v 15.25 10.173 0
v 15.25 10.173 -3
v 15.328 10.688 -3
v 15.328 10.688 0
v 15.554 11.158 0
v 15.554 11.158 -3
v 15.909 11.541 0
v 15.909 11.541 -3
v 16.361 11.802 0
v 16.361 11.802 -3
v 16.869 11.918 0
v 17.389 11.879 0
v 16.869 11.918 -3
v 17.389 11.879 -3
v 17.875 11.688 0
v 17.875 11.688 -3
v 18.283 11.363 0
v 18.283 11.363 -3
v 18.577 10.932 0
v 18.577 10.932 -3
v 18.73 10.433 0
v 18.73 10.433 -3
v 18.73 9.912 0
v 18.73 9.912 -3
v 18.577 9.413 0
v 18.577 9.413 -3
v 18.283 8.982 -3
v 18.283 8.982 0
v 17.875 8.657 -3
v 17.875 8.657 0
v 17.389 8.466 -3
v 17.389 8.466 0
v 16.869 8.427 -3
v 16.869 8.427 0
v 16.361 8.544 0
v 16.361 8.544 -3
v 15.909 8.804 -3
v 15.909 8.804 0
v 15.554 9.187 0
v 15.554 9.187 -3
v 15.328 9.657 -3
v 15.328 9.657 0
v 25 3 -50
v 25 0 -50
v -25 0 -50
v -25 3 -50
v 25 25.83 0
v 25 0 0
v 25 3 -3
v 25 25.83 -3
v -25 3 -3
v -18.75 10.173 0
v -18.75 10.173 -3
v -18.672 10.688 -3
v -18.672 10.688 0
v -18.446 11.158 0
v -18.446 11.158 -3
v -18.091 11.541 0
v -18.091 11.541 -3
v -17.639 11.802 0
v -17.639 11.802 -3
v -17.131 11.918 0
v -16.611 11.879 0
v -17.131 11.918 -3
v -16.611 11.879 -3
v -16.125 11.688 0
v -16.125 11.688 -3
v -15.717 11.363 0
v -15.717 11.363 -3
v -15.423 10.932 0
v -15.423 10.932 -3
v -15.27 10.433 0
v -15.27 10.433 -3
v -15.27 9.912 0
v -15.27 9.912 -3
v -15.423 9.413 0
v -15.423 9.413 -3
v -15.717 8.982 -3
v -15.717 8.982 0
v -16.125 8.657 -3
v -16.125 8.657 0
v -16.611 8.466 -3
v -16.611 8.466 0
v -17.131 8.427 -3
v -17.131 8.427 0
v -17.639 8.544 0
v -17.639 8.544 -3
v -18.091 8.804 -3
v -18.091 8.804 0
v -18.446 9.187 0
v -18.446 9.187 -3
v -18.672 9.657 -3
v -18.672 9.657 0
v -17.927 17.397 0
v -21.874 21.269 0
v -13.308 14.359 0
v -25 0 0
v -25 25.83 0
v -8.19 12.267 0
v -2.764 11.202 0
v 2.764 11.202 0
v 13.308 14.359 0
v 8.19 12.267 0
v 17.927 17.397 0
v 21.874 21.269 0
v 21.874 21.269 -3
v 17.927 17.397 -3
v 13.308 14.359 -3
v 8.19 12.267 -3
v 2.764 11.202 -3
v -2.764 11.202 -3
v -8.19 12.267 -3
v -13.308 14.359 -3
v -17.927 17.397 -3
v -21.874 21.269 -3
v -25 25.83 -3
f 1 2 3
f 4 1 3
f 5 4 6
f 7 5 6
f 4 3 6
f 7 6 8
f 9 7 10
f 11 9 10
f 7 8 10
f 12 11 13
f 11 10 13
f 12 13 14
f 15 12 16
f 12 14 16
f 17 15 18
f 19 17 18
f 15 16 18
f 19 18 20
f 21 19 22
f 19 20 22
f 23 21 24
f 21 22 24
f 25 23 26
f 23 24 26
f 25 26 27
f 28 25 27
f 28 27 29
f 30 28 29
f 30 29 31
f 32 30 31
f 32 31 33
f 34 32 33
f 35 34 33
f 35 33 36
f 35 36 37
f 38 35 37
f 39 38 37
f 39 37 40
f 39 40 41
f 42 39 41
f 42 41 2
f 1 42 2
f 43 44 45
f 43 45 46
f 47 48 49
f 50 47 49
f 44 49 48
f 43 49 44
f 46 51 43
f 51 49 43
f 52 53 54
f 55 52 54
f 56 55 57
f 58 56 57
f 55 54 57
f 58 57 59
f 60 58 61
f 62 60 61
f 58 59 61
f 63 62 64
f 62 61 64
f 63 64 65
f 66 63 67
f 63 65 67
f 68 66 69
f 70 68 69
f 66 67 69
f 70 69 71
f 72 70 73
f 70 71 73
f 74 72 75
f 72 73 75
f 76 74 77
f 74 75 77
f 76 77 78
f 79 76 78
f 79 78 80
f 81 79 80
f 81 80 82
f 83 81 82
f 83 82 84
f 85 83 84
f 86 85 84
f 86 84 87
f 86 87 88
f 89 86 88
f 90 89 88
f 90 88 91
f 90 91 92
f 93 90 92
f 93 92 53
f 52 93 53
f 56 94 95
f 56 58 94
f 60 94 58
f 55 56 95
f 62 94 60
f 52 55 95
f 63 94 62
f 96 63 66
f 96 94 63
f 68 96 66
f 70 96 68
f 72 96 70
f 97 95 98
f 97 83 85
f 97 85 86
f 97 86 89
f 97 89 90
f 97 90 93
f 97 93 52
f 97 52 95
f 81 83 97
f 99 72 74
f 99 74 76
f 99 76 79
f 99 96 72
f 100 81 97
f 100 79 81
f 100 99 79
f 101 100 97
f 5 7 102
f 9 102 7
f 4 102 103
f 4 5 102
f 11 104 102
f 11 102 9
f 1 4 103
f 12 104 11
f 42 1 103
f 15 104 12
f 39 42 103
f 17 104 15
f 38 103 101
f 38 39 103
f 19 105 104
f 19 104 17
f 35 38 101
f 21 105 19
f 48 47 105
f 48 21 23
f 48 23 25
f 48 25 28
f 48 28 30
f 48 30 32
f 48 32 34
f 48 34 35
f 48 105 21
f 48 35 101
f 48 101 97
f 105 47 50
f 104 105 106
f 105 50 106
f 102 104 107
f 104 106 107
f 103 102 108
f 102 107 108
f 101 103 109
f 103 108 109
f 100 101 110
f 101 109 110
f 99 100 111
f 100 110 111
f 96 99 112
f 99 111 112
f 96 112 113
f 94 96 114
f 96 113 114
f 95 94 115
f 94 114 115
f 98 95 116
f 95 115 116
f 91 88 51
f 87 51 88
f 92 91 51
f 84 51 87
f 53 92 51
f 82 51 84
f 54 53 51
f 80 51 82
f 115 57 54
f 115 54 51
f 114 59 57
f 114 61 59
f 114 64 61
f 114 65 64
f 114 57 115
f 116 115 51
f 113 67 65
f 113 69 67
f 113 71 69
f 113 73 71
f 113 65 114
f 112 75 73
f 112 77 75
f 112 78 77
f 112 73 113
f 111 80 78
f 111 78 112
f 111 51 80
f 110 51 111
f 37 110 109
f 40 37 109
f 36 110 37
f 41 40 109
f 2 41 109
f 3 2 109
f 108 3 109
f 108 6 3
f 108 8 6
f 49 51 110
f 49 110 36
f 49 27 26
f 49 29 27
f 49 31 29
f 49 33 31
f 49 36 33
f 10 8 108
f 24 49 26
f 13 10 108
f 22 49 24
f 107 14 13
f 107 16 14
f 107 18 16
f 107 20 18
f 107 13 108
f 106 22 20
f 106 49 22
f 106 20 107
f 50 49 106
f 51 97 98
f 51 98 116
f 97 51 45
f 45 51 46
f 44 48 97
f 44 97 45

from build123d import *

# Parameters (mm, degrees)
SKETCH_1_W          = 47
SKETCH_1_H          = 3
EXTRUDE_1_DEPTH     = 25
SKETCH_2_R          = 1.75
SKETCH_2_R_2        = 28.55
CUT_EXTRUDE_1_DEPTH = 4


with BuildPart() as part:
    # 草圖1 → 填料-伸長1 (new body, symmetric)
    with BuildSketch(Plane(origin=(0, 0, 0), x_dir=(0, 0, -1), z_dir=(1, 0, 0))):
        Polygon((0, 50), (0, 0), (3, 0), (3, 3), (3, 50), align=None)
        with Locations((26.5, 1.5)):
            Rectangle(SKETCH_1_W, SKETCH_1_H)
    extrude(amount=EXTRUDE_1_DEPTH, both=True)

    # 草圖2 → 除料-伸長1 (cut, through all)
    with BuildSketch(Plane(origin=(0, 0, -3), x_dir=(-1, 0, 0), z_dir=(0, 0, -1))):
        with Locations((17, 10.172548614)):
            Circle(SKETCH_2_R)
        with Locations((-17, 10.172548614)):
            Circle(SKETCH_2_R)
        with Locations((-34, 39.617412342)):
            Circle(SKETCH_2_R)
        with Locations((-17, 69.062276071)):
            Circle(SKETCH_2_R)
        with Locations((17, 69.062276071)):
            Circle(SKETCH_2_R)
        with Locations((34, 39.617412342)):
            Circle(SKETCH_2_R)
        with Locations((0, 39.617412342)):
            Circle(SKETCH_2_R_2)
    extrude(amount=-CUT_EXTRUDE_1_DEPTH, mode=Mode.SUBTRACT)


solid = part.part
